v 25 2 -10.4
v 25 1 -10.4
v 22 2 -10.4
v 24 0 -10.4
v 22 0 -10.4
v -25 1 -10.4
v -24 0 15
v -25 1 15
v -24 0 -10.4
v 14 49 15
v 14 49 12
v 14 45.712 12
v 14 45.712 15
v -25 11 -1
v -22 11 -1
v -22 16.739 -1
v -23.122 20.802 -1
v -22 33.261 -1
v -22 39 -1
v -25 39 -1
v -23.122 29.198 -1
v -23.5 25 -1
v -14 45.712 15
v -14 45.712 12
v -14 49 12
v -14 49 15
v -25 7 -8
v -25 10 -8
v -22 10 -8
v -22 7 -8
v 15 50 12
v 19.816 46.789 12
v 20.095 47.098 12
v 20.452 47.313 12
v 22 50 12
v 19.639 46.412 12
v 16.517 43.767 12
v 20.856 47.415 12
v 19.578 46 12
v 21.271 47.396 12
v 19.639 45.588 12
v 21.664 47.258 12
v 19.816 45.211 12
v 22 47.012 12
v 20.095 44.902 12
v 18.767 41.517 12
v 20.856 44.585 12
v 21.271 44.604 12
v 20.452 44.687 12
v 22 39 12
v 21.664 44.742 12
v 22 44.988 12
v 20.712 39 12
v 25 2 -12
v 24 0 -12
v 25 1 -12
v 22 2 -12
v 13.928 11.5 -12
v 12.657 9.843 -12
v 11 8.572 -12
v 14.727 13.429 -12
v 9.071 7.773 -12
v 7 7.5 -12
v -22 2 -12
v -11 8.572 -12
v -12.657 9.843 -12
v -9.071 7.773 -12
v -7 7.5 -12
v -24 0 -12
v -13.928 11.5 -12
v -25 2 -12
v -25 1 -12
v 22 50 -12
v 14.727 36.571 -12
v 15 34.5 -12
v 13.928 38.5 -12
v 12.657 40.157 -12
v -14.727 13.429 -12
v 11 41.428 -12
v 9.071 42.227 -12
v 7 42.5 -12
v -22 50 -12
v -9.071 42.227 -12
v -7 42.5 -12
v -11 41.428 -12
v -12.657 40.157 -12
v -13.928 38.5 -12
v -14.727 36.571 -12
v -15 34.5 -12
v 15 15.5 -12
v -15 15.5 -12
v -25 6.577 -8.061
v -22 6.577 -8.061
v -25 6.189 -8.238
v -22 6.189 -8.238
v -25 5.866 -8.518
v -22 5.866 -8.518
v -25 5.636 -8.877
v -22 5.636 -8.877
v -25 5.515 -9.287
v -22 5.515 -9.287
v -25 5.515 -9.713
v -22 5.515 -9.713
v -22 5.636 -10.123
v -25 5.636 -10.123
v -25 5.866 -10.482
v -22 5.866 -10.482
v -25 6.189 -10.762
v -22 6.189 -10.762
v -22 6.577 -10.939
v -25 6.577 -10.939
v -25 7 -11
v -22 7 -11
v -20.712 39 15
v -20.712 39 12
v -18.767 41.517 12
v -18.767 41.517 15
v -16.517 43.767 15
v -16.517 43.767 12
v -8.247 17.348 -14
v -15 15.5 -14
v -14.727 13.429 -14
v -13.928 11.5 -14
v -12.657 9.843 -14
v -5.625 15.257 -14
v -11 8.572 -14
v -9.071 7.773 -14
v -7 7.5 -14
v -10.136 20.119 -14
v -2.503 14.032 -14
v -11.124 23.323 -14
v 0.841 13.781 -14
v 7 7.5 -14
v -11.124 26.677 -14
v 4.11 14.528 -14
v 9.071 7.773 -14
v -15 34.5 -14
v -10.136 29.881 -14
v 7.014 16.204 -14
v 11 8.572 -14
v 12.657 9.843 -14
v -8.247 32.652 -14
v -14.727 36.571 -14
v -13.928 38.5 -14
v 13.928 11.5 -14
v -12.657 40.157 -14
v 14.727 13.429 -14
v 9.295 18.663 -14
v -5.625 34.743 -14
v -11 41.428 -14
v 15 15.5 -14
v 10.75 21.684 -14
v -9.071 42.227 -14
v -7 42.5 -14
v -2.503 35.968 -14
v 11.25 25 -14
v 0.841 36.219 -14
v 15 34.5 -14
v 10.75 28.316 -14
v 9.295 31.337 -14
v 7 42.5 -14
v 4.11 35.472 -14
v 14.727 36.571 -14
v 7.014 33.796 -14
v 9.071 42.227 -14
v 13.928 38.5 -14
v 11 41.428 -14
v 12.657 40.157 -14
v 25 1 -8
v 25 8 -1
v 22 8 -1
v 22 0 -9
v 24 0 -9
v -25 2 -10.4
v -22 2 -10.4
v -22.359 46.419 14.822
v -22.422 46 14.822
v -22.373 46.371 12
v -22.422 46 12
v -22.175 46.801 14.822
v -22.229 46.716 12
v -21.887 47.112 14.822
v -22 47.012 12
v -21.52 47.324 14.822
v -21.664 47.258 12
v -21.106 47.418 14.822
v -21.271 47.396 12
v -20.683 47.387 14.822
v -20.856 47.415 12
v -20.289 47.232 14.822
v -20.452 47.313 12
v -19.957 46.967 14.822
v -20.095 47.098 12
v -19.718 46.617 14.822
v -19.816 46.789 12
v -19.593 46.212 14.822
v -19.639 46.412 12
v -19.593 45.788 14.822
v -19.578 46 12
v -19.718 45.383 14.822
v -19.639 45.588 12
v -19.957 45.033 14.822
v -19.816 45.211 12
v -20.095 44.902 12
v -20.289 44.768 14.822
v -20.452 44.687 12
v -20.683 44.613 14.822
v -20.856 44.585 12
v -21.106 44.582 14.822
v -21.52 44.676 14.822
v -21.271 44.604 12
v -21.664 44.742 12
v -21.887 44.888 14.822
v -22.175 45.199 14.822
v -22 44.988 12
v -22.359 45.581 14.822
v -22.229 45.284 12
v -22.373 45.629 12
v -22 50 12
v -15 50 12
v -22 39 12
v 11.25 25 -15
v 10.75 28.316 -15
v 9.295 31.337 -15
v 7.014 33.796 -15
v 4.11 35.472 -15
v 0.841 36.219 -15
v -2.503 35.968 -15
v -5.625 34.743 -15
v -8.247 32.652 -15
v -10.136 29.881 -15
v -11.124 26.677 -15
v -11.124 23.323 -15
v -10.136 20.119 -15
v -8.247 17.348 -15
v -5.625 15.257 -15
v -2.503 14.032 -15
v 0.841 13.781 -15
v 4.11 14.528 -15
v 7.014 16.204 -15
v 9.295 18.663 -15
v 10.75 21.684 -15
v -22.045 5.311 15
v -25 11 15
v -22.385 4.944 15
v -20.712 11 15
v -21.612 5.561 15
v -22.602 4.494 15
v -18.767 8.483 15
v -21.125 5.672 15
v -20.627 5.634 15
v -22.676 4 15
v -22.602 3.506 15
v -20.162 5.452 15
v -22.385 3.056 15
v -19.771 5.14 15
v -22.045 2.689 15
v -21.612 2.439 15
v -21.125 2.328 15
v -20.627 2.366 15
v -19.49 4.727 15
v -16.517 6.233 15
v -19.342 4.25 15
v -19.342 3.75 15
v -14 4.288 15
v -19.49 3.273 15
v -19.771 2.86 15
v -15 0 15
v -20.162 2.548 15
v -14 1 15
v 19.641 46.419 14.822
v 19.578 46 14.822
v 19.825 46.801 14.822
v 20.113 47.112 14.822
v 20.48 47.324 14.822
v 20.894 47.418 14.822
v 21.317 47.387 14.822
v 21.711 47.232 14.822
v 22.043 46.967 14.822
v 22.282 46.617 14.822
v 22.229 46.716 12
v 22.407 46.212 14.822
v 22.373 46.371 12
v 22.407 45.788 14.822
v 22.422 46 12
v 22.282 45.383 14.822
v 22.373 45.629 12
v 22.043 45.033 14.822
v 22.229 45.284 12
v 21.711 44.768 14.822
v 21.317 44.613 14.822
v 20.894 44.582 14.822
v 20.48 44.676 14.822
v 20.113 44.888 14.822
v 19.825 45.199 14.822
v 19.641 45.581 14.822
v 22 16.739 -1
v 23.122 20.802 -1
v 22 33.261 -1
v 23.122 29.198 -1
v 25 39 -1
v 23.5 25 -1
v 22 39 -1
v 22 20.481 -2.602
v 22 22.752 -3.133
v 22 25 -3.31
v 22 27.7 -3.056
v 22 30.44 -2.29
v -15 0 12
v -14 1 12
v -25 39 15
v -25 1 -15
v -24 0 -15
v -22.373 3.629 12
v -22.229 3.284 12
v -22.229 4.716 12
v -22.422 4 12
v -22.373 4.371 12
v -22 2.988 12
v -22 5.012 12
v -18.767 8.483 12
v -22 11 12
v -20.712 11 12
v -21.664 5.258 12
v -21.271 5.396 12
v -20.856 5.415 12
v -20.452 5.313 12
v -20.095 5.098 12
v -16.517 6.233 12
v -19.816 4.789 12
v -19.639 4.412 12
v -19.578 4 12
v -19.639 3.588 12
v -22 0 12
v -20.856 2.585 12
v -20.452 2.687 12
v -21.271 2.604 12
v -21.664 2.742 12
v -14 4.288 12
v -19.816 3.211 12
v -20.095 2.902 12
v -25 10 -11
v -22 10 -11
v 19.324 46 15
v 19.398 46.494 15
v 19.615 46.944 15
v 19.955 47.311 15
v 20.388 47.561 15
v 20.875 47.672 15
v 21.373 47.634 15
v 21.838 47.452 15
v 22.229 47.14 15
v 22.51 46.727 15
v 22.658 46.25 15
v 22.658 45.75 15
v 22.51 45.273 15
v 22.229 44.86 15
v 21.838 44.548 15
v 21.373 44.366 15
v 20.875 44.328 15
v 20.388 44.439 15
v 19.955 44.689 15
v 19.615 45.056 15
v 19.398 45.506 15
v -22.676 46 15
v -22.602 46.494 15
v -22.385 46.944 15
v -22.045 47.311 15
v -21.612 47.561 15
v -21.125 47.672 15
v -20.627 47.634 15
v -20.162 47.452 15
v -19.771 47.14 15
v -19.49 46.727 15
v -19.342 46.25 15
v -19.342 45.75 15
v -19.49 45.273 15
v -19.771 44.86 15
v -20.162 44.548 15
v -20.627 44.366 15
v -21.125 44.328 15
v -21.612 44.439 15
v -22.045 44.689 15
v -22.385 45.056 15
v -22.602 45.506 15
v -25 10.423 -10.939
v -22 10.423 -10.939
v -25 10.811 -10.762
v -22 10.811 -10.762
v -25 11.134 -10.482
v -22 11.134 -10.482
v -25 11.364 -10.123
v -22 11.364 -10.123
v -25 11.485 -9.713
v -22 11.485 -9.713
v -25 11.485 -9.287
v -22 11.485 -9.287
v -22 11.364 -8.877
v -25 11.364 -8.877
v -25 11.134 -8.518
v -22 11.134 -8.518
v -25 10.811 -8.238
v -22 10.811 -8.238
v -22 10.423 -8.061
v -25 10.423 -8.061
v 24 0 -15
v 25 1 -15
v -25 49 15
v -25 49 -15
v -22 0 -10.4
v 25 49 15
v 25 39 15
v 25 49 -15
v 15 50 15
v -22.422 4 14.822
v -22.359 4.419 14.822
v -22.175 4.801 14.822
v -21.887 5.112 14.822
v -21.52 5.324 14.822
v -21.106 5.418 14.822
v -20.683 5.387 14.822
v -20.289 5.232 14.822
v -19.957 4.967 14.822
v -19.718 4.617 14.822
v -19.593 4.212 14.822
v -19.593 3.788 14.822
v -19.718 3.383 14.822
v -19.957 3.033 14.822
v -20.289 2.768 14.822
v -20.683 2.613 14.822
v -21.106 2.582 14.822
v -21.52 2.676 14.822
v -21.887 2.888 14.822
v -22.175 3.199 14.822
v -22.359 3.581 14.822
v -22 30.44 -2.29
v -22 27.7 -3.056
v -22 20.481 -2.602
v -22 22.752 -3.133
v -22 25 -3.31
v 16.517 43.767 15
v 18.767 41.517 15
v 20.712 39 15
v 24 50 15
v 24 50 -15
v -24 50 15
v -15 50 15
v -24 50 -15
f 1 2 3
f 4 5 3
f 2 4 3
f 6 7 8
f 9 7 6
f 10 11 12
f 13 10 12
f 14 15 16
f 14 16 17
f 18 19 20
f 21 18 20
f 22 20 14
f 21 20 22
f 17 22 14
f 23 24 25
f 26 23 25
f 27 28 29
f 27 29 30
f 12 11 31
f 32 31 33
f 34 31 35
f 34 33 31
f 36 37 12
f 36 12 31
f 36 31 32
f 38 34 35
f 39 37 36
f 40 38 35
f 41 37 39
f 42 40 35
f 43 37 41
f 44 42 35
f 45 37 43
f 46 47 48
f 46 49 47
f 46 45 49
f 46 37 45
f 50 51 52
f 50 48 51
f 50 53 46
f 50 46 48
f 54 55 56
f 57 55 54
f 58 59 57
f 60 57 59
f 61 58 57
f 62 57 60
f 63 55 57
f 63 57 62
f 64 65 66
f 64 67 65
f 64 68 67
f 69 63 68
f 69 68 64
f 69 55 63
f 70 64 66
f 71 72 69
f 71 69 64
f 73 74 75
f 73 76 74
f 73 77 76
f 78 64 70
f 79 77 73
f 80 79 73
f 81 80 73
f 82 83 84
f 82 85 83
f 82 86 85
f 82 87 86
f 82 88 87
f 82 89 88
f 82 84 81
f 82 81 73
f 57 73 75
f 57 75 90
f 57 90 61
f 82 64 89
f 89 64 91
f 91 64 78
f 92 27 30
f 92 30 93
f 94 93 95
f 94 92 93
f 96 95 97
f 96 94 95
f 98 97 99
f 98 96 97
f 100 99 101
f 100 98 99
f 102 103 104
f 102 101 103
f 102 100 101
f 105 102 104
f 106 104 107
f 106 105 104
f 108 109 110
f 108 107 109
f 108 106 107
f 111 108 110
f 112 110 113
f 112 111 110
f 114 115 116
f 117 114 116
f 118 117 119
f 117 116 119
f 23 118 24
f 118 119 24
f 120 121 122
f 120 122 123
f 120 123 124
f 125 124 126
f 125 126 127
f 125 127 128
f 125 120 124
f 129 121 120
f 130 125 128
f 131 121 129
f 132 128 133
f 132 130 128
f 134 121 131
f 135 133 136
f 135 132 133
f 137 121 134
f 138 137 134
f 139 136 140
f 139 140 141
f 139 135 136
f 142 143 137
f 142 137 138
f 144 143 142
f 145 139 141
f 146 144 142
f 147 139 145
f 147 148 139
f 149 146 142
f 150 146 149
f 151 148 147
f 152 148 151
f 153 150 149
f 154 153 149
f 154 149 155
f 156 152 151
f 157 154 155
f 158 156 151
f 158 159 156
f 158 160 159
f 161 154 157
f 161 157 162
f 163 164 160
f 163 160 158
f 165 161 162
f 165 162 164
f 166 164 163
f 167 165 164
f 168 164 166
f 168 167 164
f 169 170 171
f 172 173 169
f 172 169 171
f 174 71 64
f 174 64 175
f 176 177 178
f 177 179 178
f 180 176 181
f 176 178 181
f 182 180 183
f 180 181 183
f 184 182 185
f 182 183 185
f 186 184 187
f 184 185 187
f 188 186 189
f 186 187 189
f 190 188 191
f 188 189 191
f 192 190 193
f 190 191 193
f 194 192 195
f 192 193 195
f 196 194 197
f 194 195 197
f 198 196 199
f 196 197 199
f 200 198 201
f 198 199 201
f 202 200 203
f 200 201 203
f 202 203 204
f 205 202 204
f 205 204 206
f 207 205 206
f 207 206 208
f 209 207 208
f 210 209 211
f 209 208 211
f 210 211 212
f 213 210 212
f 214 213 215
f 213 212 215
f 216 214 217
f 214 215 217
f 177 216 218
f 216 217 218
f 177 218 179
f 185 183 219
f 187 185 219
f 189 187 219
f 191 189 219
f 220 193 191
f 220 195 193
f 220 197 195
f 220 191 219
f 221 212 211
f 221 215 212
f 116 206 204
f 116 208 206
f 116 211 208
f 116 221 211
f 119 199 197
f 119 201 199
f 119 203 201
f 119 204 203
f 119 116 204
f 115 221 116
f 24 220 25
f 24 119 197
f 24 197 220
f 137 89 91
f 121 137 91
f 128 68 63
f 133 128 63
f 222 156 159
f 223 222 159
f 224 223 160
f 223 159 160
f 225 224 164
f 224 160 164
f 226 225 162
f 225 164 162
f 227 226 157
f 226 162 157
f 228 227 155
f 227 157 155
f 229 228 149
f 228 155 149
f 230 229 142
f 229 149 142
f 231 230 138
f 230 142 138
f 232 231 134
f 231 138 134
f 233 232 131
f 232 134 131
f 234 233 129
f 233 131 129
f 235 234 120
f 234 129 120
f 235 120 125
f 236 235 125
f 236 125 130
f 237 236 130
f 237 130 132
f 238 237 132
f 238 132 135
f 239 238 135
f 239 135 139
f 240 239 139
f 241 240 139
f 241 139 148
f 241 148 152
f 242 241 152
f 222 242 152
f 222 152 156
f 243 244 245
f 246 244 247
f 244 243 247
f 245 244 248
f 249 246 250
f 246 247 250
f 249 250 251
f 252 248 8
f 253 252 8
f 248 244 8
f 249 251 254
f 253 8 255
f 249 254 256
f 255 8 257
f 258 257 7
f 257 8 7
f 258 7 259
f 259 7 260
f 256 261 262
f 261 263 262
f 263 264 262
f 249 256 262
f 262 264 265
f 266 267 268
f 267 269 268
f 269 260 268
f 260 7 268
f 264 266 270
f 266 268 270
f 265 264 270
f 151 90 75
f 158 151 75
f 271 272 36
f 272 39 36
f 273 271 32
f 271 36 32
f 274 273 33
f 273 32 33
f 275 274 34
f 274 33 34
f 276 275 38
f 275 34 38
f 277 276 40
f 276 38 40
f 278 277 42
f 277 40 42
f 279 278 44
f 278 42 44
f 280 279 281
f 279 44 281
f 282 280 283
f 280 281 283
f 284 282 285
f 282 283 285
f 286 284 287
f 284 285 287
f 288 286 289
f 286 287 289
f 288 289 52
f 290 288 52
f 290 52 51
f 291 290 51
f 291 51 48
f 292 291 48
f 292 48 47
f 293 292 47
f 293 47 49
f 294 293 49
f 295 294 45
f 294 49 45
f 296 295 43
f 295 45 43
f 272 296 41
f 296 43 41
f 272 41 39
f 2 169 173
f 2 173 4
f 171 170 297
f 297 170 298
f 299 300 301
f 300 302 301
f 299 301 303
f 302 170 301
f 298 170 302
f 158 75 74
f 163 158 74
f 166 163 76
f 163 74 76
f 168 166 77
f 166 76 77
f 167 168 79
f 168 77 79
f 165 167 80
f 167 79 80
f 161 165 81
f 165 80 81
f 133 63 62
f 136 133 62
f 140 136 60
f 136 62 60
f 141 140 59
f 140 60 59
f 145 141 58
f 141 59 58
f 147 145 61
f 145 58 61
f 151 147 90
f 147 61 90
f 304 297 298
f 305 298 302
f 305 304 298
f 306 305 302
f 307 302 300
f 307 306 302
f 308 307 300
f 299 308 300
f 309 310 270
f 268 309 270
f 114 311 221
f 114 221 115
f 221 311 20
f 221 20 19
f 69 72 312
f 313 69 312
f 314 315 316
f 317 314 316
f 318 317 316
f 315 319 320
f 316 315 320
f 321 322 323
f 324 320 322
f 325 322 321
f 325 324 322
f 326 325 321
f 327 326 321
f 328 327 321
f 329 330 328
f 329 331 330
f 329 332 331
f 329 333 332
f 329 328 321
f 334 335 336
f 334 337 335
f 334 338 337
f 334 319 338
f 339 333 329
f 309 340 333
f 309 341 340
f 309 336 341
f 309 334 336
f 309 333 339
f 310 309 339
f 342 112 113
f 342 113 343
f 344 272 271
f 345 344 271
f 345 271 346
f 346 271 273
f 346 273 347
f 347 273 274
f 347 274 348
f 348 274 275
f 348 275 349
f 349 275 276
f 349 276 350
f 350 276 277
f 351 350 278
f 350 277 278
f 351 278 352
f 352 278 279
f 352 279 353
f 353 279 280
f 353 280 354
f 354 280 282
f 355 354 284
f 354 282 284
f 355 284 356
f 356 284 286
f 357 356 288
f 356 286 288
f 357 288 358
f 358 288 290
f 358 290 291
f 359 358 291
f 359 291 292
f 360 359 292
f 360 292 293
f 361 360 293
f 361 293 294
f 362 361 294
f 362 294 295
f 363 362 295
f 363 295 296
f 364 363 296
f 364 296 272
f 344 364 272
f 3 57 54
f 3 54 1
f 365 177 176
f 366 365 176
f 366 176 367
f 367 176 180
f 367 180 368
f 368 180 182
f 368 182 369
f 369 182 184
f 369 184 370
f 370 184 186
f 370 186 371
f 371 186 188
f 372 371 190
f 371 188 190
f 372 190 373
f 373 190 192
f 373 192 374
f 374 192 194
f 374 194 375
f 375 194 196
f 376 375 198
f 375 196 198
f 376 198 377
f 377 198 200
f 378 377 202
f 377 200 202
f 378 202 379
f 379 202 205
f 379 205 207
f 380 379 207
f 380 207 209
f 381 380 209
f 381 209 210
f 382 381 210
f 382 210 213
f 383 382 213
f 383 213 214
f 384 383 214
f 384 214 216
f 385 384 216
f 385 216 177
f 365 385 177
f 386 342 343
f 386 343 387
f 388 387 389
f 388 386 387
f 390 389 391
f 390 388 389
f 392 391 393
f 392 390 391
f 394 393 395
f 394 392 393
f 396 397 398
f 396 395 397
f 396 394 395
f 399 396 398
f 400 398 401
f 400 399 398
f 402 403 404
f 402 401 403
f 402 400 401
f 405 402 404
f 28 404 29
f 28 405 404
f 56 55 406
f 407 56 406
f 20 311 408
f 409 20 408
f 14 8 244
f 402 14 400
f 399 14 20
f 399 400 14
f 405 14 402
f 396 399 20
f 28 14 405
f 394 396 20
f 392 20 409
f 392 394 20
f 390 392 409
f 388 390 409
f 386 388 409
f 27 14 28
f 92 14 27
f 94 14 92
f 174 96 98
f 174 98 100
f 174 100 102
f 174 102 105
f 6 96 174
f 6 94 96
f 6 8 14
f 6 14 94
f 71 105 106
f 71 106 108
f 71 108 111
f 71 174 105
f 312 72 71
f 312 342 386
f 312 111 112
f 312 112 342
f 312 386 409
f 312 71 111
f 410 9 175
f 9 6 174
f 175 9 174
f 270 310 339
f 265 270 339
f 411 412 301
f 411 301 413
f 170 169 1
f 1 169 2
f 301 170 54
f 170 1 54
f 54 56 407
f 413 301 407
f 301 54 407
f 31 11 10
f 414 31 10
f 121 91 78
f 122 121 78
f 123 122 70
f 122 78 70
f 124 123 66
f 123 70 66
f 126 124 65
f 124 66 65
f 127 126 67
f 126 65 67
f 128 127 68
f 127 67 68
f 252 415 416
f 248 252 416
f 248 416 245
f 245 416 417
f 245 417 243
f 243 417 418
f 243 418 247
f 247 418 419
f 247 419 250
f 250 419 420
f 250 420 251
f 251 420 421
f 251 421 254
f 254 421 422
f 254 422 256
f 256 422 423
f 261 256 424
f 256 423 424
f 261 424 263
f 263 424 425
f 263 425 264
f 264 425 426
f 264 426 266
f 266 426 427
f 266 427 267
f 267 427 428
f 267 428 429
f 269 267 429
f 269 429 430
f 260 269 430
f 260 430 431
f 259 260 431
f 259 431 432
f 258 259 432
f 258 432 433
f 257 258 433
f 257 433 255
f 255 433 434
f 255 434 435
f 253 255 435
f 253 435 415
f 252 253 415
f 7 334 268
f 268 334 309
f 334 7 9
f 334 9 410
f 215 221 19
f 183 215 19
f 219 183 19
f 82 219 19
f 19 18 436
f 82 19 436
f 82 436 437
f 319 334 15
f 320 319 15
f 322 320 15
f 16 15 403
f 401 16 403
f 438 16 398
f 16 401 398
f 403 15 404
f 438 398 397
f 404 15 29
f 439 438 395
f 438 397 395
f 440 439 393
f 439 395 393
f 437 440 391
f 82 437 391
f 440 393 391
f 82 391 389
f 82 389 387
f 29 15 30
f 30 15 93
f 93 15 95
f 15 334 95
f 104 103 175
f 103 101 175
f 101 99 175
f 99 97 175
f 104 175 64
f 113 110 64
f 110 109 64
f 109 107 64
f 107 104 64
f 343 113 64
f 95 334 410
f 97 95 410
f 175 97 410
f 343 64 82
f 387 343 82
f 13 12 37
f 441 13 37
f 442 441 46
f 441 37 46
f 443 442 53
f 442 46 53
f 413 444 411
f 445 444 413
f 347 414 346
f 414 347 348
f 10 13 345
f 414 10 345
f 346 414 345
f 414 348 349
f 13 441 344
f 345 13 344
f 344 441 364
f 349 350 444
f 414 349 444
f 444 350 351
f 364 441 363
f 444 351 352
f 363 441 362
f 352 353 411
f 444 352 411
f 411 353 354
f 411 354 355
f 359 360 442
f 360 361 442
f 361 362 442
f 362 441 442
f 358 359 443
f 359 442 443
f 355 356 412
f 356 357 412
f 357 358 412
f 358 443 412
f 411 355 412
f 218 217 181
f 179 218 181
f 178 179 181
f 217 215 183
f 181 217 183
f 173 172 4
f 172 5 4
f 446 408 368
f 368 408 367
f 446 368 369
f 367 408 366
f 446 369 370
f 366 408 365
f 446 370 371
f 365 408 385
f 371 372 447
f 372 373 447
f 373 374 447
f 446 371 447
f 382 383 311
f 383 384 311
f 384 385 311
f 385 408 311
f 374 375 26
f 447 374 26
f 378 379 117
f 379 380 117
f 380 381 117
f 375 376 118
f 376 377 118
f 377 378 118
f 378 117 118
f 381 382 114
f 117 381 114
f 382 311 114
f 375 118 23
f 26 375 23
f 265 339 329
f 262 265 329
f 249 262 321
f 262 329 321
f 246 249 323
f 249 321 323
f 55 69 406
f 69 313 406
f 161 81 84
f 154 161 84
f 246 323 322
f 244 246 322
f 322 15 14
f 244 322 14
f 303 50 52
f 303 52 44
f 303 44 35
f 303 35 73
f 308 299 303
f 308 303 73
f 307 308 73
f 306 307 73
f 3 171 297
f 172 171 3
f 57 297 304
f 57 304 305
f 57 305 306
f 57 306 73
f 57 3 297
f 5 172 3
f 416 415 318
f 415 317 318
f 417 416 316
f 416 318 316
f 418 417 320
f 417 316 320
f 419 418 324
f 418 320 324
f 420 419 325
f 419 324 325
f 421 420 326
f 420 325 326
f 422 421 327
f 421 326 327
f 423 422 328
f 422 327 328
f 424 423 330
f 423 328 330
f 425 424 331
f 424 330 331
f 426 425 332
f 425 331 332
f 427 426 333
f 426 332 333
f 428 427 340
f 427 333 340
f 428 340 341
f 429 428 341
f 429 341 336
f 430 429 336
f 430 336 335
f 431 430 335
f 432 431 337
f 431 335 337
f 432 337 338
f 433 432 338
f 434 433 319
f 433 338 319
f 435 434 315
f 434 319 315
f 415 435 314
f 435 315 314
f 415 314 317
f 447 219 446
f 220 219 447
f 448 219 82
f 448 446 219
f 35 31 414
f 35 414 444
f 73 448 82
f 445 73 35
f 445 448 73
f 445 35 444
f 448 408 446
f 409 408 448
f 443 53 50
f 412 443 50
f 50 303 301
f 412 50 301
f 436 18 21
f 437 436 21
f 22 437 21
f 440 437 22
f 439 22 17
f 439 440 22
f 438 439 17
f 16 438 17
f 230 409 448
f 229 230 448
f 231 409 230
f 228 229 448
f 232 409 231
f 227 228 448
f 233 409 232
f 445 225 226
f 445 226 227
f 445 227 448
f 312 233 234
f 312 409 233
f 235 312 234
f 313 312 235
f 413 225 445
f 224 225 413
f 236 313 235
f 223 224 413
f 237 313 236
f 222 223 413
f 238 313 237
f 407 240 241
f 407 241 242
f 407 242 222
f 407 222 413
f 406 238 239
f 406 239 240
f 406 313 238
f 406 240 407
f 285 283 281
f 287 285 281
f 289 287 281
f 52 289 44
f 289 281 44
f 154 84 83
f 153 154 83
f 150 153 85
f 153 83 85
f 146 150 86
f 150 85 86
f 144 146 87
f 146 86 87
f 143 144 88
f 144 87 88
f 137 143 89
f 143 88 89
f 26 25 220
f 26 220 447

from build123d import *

# Parameters (mm, degrees)
SKETCH_1_W                   = 50
SKETCH_1_H                   = 30
SKETCH_1_W_2                 = 44
SKETCH_1_H_2                 = 24
EXTRUDE_1_DEPTH              = 50
CUT_EXTRUDE_START            = -14
CUT_EXTRUDE_1_DEPTH          = 17
SKETCH_3_R                   = 11.25
CUT_EXTRUDE_2_DEPTH          = 4
HOLE_WIZARD_4_40_D           = 2.8448
HOLE_WIZARD_4_40_DEPTH       = 3
HOLE_WIZARD_4_40_CSINK_D     = 3.3528
HOLE_WIZARD_4_40_CSINK_ANGLE = 110
SKETCH_10_W                  = 1.6
SKETCH_10_H                  = 2
CUT_EXTRUDE_4_DEPTH          = 51
CUT_EXTRUDE_3_DEPTH          = 2
CHAMFER_1_SIZE               = 8
CHAMFER_2_SIZE               = 1
CUT_EXTRUDE_5_REACH          = 52


with BuildPart() as part:
    # Эскиз1 → Бобышка-Вытянуть1 (new body)
    with BuildSketch(Plane(origin=(0, 0, 0), x_dir=(1, 0, 0), z_dir=(0, 1, 0))):
        Rectangle(SKETCH_1_W, SKETCH_1_H)
        Rectangle(SKETCH_1_W_2, SKETCH_1_H_2, mode=Mode.SUBTRACT)
    extrude(amount=EXTRUDE_1_DEPTH)

    # Эскиз2 → Вырез-Вытянуть1 (cut, through all)
    with BuildSketch(Plane(origin=(0, 0, -15), x_dir=(-1, 0, 0), z_dir=(0, 0, -1)).offset(CUT_EXTRUDE_START)):
        with BuildLine():
            ThreePointArc((-14, 45.712315177), (-17.67766953, 42.67766953), (-20.712315177, 39))
            Line((-20.712315177, 39), (-25, 39))
            Line((-25, 39), (-25, 11))
            Line((-25, 11), (-20.712315177, 11))
            ThreePointArc((-20.712315177, 11), (-17.67766953, 7.32233047), (-14, 4.287684823))
            Line((-14, 4.287684823), (-14, 0))
            Line((-14, 0), (14, 0))
            Line((14, 0), (14, 4.287684823))
            ThreePointArc((14, 4.287684823), (17.67766953, 7.32233047), (20.712315177, 11))
            Line((20.712315177, 11), (25, 11))
            Line((25, 11), (25, 39))
            Line((25, 39), (20.712315177, 39))
            ThreePointArc((20.712315177, 39), (17.67766953, 42.67766953), (14, 45.712315177))
            Line((14, 45.712315177), (14, 50))
            Line((14, 50), (-14, 50))
            Line((-14, 50), (-14, 45.712315177))
        make_face()
        with BuildLine():
            Line((-20.712315177, 11), (-25, 11))
            Line((-25, 11), (-25, 0))
            Line((-25, 0), (-14, 0))
            Line((-14, 0), (-14, 4.287684823))
            ThreePointArc((-14, 4.287684823), (-17.67766953, 7.32233047), (-20.712315177, 11))
        make_face()
    extrude(amount=-CUT_EXTRUDE_1_DEPTH, mode=Mode.SUBTRACT)

    # Эскиз3 → Вырез-Вытянуть2 (cut, through all)
    with BuildSketch(Plane.XY.offset(-12)):
        with Locations((0, 25)):
            Circle(SKETCH_3_R)
    extrude(amount=-CUT_EXTRUDE_2_DEPTH, mode=Mode.SUBTRACT)

    # Эскиз6 → Вырез-Повернуть1 (revolve, cut)
    with BuildSketch(Plane(origin=(0, 25, 0), x_dir=(-1, 0, 0), z_dir=(0, 1, 0))):
        Polygon((-22, -3.309797446), (-22, -1), (-23.5, -1), align=None)
    revolve(axis=Axis((0, 25, -15), (0, 0, 1)), mode=Mode.SUBTRACT)

    # Отверстие #4-40
    with Locations(Plane.XY.offset(15)):
        with Locations((-21, 46), (21, 46), (-21, 4)):
            CounterSinkHole(HOLE_WIZARD_4_40_D / 2, HOLE_WIZARD_4_40_CSINK_D / 2, depth=HOLE_WIZARD_4_40_DEPTH, counter_sink_angle=HOLE_WIZARD_4_40_CSINK_ANGLE)

    # Эскиз10 → Вырез-Вытянуть4 (cut, through all)
    with BuildSketch(Plane.ZY.offset(25)):
        with Locations((-11.2, 1)):
            Rectangle(SKETCH_10_W, SKETCH_10_H)
    extrude(amount=-CUT_EXTRUDE_4_DEPTH, mode=Mode.SUBTRACT)

    # Эскиз9 → Вырез-Вытянуть3 (cut)
    with BuildSketch(Plane.XY.offset(-12)):
        with BuildLine():
            Line((-7, 7.5), (7, 7.5))
            ThreePointArc((7, 7.5), (12.656854249, 9.843145751), (15, 15.5))
            Line((15, 15.5), (15, 34.5))
            ThreePointArc((15, 34.5), (12.656854249, 40.156854249), (7, 42.5))
            Line((7, 42.5), (-7, 42.5))
            ThreePointArc((-7, 42.5), (-12.656854249, 40.156854249), (-15, 34.5))
            Line((-15, 34.5), (-15, 15.5))
            ThreePointArc((-15, 15.5), (-12.656854249, 9.843145751), (-7, 7.5))
        make_face()
    extrude(amount=-CUT_EXTRUDE_3_DEPTH, mode=Mode.SUBTRACT)

    # Фаска1
    chamfer_1_edges = [part.edges().sort_by_distance(p)[0] for p in [
        (23.5, 0, -1),
    ]]
    chamfer(chamfer_1_edges, length=CHAMFER_1_SIZE)

    # Фаска2
    chamfer_2_edges = [part.edges().sort_by_distance(p)[0] for p in [
        (-25, 50, 0),
        (25, 0, -13.5),
        (-25, 0, 2.3),
        (25, 0, -9.7),
        (25, 50, 0),
        (-25, 0, -13.5),
        (14, 50, 13.5),
        (-14, 50, 13.5),
        (-14, 0, 13.5),
    ]]
    chamfer(chamfer_2_edges, length=CHAMFER_2_SIZE)

    # Эскиз11 → Вырез-Вытянуть5 (cut, up to next)
    with BuildSketch(Plane.ZY.offset(25), mode=Mode.PRIVATE) as cut_extrude_5_sk1:
        with BuildLine():
            Line((-8, 10), (-8, 7))
            ThreePointArc((-8, 7), (-9.5, 5.5), (-11, 7))
            Line((-11, 7), (-11, 10))
            ThreePointArc((-11, 10), (-9.5, 11.5), (-8, 10))
        make_face()
    cut_extrude_5_tool1 = extrude(cut_extrude_5_sk1.sketch, amount=-CUT_EXTRUDE_5_REACH, mode=Mode.PRIVATE) & part.part
    add(cut_extrude_5_tool1.solids().sort_by_distance((-25, 8.5, -9.5))[0], mode=Mode.SUBTRACT)


solid = part.part
